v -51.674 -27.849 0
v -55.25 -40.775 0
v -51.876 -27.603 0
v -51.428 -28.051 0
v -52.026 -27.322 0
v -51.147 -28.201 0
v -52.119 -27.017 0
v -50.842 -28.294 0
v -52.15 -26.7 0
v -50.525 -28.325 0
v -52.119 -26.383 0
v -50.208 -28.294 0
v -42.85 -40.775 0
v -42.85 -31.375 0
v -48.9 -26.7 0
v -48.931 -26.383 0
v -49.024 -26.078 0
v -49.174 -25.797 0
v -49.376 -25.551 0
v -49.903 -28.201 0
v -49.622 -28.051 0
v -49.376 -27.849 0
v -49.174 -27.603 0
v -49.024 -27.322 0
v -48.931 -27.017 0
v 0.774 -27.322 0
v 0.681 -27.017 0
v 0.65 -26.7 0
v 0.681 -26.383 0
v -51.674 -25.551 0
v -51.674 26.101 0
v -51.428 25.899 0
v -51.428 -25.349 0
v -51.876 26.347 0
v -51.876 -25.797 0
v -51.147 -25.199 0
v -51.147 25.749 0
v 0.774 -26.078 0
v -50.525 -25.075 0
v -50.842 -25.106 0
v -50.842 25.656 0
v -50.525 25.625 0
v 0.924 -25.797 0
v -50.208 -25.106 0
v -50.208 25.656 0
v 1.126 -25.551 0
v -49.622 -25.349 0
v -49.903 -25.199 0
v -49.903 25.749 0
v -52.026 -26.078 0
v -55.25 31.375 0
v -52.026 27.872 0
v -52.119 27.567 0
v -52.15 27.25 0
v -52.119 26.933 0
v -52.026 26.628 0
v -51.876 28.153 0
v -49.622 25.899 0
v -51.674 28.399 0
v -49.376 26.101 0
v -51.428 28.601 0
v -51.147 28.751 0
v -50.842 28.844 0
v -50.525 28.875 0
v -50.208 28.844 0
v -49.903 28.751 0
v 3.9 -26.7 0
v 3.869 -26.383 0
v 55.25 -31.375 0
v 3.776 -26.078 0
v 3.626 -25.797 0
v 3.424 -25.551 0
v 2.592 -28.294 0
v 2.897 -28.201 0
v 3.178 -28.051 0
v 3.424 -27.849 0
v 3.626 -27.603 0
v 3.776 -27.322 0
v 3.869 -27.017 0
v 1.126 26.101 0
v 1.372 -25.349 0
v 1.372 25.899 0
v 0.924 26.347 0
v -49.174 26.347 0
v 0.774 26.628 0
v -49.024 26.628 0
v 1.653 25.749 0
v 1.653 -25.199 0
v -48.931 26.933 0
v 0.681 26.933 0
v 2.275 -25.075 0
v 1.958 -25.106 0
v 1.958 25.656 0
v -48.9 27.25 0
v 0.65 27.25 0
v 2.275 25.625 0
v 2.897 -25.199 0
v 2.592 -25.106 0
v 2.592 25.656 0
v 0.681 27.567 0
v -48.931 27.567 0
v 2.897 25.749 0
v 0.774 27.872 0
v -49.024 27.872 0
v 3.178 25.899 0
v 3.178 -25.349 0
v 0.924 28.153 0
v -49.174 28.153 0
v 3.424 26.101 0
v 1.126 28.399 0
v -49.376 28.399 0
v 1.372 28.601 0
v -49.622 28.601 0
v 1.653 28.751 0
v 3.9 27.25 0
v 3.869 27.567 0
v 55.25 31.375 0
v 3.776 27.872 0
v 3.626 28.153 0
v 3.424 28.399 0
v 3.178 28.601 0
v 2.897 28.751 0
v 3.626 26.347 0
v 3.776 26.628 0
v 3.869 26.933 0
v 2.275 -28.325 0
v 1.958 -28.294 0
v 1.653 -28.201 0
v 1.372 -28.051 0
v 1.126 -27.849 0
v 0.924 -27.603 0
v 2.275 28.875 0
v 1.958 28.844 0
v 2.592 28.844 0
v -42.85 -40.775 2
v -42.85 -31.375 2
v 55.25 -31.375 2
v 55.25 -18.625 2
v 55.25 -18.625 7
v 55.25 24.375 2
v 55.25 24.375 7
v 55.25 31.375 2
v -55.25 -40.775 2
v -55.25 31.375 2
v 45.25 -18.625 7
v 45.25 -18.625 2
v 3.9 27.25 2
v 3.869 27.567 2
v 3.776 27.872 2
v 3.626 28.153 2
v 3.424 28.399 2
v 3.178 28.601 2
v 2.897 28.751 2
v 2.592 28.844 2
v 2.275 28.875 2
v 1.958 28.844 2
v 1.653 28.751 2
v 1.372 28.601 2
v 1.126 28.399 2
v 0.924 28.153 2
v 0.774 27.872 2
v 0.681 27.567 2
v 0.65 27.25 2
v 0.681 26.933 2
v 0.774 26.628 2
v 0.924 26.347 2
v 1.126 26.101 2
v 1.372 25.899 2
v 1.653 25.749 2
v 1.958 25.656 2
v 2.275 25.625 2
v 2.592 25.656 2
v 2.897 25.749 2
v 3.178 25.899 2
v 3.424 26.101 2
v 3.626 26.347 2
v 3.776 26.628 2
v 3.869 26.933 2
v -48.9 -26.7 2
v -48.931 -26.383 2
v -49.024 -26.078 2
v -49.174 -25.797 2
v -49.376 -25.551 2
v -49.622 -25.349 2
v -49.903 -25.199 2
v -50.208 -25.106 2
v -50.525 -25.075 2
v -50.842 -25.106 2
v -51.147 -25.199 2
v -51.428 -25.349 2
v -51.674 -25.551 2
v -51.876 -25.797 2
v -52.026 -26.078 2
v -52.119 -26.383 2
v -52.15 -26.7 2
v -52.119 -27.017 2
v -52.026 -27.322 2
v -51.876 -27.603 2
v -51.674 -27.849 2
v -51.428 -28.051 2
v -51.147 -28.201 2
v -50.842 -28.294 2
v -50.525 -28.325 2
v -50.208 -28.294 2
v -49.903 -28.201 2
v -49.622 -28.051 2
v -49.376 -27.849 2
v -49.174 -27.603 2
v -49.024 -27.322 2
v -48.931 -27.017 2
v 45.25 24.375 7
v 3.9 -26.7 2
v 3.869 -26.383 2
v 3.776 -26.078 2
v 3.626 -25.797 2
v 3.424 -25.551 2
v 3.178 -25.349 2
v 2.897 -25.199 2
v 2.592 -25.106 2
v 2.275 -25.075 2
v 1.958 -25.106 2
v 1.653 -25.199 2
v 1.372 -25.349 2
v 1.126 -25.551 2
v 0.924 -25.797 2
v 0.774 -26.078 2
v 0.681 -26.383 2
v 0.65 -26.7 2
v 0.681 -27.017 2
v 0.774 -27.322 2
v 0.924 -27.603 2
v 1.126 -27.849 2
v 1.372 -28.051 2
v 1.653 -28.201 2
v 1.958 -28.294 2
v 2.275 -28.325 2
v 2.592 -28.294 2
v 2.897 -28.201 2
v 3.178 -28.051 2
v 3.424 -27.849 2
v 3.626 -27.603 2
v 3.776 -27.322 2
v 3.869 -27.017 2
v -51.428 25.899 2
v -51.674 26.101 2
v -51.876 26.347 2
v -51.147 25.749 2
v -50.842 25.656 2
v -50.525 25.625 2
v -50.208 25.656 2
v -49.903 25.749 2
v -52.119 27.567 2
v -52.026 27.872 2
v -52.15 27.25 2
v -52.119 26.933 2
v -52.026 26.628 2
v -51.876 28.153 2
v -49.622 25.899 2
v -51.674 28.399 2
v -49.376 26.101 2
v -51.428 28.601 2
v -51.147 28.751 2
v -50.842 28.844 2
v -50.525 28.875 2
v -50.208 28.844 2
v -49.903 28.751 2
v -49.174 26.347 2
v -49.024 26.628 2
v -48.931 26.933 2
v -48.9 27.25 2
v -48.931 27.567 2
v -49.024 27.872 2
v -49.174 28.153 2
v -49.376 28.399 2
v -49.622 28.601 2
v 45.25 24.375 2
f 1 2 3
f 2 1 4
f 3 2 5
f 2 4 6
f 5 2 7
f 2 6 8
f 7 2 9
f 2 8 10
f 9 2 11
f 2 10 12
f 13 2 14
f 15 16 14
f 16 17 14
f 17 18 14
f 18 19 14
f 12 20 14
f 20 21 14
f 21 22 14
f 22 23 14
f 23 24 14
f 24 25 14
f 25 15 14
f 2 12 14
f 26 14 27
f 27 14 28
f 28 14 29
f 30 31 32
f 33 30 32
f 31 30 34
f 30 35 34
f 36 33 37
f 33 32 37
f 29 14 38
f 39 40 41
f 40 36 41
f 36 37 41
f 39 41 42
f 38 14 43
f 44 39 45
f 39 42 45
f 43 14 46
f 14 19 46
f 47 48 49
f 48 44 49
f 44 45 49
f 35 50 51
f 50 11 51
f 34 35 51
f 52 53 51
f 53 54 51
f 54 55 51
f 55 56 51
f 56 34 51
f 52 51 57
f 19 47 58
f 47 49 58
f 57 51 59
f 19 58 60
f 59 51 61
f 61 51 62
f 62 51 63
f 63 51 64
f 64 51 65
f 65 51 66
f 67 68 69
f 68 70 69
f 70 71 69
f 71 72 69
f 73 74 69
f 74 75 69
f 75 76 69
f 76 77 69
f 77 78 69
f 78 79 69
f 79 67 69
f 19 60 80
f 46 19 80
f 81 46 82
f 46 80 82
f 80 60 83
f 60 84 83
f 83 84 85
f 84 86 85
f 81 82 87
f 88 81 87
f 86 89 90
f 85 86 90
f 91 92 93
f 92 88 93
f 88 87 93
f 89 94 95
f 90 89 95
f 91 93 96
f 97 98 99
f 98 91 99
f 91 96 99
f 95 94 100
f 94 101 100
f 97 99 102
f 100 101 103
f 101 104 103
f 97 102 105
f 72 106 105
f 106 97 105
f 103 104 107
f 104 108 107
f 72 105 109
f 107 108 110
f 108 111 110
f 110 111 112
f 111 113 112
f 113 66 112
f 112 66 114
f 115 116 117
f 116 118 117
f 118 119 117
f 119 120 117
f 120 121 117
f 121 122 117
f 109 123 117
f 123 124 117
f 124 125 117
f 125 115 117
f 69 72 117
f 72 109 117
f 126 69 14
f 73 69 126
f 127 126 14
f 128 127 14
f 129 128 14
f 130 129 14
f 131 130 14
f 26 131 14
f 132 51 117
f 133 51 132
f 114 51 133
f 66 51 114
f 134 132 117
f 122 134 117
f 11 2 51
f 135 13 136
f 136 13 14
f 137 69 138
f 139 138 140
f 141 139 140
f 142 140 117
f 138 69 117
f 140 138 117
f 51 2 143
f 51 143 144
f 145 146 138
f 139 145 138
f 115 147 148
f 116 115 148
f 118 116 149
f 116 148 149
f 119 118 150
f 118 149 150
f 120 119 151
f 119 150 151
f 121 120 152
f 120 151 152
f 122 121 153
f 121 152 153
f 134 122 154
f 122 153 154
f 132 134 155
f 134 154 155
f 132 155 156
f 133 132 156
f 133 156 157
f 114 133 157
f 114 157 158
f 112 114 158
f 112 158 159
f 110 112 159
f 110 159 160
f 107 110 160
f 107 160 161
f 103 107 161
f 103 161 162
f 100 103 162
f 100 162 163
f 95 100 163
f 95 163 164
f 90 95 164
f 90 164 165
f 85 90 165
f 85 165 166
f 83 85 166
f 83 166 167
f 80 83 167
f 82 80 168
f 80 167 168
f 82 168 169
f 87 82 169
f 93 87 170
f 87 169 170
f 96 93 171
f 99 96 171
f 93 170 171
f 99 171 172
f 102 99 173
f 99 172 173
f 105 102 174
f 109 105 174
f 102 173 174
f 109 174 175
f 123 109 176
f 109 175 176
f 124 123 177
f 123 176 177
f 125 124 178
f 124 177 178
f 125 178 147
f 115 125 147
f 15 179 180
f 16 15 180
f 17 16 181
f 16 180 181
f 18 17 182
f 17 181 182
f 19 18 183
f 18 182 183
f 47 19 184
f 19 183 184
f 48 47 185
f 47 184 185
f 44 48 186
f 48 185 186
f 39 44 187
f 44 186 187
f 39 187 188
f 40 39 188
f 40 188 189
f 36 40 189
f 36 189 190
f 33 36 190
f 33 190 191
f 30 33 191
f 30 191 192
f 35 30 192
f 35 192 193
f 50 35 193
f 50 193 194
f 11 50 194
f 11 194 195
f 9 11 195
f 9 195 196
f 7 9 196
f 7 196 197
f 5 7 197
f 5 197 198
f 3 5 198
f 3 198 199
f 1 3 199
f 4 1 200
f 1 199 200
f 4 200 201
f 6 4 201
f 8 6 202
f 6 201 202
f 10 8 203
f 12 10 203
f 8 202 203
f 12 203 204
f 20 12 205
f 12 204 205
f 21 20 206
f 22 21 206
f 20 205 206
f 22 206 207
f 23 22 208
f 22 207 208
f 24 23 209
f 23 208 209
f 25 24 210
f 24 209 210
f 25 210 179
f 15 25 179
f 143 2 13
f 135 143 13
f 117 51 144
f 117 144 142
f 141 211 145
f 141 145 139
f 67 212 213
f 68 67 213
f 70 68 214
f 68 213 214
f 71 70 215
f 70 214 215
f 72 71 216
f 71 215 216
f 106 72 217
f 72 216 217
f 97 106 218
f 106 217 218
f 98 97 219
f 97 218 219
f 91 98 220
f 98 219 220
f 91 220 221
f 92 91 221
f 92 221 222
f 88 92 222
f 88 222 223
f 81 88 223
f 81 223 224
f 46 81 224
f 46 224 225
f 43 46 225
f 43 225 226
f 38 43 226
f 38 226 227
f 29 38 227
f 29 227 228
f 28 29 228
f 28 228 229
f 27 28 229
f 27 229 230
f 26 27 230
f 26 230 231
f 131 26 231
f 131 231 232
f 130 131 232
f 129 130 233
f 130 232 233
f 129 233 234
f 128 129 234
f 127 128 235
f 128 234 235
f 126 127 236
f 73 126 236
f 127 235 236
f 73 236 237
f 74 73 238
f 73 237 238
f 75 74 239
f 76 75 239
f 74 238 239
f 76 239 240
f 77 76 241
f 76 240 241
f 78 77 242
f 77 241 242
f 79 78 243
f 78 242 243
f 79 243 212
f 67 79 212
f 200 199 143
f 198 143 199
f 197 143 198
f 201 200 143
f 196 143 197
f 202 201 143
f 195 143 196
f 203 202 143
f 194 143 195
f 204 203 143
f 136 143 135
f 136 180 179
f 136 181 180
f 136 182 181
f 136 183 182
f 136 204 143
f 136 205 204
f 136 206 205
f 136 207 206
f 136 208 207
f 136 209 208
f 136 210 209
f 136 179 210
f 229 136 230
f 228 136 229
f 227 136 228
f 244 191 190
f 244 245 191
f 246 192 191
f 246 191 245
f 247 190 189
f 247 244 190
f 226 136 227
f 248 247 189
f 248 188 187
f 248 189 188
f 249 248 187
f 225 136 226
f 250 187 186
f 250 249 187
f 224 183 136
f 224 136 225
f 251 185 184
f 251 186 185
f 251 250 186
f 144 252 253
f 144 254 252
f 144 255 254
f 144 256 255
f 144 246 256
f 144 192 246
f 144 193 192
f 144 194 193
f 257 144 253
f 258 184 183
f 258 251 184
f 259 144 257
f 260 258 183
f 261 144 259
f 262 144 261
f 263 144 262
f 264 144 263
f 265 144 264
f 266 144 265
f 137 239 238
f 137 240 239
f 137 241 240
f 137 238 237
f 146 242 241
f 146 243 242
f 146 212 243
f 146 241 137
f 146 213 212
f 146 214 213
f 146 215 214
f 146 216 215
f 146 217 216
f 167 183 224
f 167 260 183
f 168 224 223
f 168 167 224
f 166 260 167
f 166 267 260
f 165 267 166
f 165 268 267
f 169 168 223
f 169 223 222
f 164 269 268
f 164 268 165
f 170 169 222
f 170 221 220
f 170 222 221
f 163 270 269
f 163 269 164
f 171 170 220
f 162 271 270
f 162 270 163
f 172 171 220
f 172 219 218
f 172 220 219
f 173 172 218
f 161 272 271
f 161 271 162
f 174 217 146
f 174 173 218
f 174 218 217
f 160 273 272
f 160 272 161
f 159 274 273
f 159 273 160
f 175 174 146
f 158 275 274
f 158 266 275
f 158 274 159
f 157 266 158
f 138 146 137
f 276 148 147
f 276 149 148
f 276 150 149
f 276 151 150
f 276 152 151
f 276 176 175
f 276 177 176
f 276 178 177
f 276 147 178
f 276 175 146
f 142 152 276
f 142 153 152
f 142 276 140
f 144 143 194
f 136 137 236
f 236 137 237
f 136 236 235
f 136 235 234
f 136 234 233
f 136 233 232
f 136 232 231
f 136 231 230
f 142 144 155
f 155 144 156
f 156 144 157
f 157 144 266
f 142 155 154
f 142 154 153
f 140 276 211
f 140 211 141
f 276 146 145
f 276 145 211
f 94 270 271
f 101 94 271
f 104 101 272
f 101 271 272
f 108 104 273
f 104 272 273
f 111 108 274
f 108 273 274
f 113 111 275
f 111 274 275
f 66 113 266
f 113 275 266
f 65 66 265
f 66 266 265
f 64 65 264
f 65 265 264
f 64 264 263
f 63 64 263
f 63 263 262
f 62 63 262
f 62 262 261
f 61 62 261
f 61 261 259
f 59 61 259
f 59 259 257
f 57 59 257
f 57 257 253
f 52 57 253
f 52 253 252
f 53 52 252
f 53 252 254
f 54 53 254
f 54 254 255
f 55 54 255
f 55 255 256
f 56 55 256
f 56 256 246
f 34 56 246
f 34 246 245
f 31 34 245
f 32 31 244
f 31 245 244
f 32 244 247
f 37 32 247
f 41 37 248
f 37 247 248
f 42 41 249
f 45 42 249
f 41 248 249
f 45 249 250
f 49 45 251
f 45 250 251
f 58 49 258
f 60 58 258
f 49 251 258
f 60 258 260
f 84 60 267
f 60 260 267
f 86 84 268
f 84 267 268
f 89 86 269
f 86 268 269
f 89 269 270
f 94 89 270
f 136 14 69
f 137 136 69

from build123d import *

# Parameters (mm, degrees)
F0_W     = 110.5
F0_H     = 62.75
F1_DEPTH = 2
F2_W     = 12.4
F2_H     = 9.4
F3_DEPTH = 2
F4_R     = 1.625
F5_DEPTH = 2.001
F6_W     = 10
F6_H     = 43
F7_DEPTH = 5


with BuildPart() as f1:
    # F0 (on Top) → F1 (new body)
    with BuildSketch(Plane.XY):
        Rectangle(F0_W, F0_H)
    extrude(amount=F1_DEPTH)

    # F2 (on Top) → F3 (join, through all)
    with BuildSketch(Plane.XY):
        with Locations((-49.05, -36.075)):
            Rectangle(F2_W, F2_H)
    extrude(amount=F3_DEPTH)

    # F4 (on face) → F5 (cut, through all)
    with BuildSketch(Plane.XY.offset(2)):
        with Locations((-50.525, 27.25)):
            Circle(F4_R)
        with Locations((2.275, 27.25)):
            Circle(F4_R)
        with Locations((2.275, -26.7)):
            Circle(F4_R)
        with Locations((-50.525, -26.7)):
            Circle(F4_R)
    extrude(amount=-F5_DEPTH, mode=Mode.SUBTRACT)

    # F6 (on face) → F7 (join)
    with BuildSketch(Plane.XY.offset(2)):
        with Locations((50.25, 2.875)):
            Rectangle(F6_W, F6_H)
    extrude(amount=F7_DEPTH)


solid = f1.part
